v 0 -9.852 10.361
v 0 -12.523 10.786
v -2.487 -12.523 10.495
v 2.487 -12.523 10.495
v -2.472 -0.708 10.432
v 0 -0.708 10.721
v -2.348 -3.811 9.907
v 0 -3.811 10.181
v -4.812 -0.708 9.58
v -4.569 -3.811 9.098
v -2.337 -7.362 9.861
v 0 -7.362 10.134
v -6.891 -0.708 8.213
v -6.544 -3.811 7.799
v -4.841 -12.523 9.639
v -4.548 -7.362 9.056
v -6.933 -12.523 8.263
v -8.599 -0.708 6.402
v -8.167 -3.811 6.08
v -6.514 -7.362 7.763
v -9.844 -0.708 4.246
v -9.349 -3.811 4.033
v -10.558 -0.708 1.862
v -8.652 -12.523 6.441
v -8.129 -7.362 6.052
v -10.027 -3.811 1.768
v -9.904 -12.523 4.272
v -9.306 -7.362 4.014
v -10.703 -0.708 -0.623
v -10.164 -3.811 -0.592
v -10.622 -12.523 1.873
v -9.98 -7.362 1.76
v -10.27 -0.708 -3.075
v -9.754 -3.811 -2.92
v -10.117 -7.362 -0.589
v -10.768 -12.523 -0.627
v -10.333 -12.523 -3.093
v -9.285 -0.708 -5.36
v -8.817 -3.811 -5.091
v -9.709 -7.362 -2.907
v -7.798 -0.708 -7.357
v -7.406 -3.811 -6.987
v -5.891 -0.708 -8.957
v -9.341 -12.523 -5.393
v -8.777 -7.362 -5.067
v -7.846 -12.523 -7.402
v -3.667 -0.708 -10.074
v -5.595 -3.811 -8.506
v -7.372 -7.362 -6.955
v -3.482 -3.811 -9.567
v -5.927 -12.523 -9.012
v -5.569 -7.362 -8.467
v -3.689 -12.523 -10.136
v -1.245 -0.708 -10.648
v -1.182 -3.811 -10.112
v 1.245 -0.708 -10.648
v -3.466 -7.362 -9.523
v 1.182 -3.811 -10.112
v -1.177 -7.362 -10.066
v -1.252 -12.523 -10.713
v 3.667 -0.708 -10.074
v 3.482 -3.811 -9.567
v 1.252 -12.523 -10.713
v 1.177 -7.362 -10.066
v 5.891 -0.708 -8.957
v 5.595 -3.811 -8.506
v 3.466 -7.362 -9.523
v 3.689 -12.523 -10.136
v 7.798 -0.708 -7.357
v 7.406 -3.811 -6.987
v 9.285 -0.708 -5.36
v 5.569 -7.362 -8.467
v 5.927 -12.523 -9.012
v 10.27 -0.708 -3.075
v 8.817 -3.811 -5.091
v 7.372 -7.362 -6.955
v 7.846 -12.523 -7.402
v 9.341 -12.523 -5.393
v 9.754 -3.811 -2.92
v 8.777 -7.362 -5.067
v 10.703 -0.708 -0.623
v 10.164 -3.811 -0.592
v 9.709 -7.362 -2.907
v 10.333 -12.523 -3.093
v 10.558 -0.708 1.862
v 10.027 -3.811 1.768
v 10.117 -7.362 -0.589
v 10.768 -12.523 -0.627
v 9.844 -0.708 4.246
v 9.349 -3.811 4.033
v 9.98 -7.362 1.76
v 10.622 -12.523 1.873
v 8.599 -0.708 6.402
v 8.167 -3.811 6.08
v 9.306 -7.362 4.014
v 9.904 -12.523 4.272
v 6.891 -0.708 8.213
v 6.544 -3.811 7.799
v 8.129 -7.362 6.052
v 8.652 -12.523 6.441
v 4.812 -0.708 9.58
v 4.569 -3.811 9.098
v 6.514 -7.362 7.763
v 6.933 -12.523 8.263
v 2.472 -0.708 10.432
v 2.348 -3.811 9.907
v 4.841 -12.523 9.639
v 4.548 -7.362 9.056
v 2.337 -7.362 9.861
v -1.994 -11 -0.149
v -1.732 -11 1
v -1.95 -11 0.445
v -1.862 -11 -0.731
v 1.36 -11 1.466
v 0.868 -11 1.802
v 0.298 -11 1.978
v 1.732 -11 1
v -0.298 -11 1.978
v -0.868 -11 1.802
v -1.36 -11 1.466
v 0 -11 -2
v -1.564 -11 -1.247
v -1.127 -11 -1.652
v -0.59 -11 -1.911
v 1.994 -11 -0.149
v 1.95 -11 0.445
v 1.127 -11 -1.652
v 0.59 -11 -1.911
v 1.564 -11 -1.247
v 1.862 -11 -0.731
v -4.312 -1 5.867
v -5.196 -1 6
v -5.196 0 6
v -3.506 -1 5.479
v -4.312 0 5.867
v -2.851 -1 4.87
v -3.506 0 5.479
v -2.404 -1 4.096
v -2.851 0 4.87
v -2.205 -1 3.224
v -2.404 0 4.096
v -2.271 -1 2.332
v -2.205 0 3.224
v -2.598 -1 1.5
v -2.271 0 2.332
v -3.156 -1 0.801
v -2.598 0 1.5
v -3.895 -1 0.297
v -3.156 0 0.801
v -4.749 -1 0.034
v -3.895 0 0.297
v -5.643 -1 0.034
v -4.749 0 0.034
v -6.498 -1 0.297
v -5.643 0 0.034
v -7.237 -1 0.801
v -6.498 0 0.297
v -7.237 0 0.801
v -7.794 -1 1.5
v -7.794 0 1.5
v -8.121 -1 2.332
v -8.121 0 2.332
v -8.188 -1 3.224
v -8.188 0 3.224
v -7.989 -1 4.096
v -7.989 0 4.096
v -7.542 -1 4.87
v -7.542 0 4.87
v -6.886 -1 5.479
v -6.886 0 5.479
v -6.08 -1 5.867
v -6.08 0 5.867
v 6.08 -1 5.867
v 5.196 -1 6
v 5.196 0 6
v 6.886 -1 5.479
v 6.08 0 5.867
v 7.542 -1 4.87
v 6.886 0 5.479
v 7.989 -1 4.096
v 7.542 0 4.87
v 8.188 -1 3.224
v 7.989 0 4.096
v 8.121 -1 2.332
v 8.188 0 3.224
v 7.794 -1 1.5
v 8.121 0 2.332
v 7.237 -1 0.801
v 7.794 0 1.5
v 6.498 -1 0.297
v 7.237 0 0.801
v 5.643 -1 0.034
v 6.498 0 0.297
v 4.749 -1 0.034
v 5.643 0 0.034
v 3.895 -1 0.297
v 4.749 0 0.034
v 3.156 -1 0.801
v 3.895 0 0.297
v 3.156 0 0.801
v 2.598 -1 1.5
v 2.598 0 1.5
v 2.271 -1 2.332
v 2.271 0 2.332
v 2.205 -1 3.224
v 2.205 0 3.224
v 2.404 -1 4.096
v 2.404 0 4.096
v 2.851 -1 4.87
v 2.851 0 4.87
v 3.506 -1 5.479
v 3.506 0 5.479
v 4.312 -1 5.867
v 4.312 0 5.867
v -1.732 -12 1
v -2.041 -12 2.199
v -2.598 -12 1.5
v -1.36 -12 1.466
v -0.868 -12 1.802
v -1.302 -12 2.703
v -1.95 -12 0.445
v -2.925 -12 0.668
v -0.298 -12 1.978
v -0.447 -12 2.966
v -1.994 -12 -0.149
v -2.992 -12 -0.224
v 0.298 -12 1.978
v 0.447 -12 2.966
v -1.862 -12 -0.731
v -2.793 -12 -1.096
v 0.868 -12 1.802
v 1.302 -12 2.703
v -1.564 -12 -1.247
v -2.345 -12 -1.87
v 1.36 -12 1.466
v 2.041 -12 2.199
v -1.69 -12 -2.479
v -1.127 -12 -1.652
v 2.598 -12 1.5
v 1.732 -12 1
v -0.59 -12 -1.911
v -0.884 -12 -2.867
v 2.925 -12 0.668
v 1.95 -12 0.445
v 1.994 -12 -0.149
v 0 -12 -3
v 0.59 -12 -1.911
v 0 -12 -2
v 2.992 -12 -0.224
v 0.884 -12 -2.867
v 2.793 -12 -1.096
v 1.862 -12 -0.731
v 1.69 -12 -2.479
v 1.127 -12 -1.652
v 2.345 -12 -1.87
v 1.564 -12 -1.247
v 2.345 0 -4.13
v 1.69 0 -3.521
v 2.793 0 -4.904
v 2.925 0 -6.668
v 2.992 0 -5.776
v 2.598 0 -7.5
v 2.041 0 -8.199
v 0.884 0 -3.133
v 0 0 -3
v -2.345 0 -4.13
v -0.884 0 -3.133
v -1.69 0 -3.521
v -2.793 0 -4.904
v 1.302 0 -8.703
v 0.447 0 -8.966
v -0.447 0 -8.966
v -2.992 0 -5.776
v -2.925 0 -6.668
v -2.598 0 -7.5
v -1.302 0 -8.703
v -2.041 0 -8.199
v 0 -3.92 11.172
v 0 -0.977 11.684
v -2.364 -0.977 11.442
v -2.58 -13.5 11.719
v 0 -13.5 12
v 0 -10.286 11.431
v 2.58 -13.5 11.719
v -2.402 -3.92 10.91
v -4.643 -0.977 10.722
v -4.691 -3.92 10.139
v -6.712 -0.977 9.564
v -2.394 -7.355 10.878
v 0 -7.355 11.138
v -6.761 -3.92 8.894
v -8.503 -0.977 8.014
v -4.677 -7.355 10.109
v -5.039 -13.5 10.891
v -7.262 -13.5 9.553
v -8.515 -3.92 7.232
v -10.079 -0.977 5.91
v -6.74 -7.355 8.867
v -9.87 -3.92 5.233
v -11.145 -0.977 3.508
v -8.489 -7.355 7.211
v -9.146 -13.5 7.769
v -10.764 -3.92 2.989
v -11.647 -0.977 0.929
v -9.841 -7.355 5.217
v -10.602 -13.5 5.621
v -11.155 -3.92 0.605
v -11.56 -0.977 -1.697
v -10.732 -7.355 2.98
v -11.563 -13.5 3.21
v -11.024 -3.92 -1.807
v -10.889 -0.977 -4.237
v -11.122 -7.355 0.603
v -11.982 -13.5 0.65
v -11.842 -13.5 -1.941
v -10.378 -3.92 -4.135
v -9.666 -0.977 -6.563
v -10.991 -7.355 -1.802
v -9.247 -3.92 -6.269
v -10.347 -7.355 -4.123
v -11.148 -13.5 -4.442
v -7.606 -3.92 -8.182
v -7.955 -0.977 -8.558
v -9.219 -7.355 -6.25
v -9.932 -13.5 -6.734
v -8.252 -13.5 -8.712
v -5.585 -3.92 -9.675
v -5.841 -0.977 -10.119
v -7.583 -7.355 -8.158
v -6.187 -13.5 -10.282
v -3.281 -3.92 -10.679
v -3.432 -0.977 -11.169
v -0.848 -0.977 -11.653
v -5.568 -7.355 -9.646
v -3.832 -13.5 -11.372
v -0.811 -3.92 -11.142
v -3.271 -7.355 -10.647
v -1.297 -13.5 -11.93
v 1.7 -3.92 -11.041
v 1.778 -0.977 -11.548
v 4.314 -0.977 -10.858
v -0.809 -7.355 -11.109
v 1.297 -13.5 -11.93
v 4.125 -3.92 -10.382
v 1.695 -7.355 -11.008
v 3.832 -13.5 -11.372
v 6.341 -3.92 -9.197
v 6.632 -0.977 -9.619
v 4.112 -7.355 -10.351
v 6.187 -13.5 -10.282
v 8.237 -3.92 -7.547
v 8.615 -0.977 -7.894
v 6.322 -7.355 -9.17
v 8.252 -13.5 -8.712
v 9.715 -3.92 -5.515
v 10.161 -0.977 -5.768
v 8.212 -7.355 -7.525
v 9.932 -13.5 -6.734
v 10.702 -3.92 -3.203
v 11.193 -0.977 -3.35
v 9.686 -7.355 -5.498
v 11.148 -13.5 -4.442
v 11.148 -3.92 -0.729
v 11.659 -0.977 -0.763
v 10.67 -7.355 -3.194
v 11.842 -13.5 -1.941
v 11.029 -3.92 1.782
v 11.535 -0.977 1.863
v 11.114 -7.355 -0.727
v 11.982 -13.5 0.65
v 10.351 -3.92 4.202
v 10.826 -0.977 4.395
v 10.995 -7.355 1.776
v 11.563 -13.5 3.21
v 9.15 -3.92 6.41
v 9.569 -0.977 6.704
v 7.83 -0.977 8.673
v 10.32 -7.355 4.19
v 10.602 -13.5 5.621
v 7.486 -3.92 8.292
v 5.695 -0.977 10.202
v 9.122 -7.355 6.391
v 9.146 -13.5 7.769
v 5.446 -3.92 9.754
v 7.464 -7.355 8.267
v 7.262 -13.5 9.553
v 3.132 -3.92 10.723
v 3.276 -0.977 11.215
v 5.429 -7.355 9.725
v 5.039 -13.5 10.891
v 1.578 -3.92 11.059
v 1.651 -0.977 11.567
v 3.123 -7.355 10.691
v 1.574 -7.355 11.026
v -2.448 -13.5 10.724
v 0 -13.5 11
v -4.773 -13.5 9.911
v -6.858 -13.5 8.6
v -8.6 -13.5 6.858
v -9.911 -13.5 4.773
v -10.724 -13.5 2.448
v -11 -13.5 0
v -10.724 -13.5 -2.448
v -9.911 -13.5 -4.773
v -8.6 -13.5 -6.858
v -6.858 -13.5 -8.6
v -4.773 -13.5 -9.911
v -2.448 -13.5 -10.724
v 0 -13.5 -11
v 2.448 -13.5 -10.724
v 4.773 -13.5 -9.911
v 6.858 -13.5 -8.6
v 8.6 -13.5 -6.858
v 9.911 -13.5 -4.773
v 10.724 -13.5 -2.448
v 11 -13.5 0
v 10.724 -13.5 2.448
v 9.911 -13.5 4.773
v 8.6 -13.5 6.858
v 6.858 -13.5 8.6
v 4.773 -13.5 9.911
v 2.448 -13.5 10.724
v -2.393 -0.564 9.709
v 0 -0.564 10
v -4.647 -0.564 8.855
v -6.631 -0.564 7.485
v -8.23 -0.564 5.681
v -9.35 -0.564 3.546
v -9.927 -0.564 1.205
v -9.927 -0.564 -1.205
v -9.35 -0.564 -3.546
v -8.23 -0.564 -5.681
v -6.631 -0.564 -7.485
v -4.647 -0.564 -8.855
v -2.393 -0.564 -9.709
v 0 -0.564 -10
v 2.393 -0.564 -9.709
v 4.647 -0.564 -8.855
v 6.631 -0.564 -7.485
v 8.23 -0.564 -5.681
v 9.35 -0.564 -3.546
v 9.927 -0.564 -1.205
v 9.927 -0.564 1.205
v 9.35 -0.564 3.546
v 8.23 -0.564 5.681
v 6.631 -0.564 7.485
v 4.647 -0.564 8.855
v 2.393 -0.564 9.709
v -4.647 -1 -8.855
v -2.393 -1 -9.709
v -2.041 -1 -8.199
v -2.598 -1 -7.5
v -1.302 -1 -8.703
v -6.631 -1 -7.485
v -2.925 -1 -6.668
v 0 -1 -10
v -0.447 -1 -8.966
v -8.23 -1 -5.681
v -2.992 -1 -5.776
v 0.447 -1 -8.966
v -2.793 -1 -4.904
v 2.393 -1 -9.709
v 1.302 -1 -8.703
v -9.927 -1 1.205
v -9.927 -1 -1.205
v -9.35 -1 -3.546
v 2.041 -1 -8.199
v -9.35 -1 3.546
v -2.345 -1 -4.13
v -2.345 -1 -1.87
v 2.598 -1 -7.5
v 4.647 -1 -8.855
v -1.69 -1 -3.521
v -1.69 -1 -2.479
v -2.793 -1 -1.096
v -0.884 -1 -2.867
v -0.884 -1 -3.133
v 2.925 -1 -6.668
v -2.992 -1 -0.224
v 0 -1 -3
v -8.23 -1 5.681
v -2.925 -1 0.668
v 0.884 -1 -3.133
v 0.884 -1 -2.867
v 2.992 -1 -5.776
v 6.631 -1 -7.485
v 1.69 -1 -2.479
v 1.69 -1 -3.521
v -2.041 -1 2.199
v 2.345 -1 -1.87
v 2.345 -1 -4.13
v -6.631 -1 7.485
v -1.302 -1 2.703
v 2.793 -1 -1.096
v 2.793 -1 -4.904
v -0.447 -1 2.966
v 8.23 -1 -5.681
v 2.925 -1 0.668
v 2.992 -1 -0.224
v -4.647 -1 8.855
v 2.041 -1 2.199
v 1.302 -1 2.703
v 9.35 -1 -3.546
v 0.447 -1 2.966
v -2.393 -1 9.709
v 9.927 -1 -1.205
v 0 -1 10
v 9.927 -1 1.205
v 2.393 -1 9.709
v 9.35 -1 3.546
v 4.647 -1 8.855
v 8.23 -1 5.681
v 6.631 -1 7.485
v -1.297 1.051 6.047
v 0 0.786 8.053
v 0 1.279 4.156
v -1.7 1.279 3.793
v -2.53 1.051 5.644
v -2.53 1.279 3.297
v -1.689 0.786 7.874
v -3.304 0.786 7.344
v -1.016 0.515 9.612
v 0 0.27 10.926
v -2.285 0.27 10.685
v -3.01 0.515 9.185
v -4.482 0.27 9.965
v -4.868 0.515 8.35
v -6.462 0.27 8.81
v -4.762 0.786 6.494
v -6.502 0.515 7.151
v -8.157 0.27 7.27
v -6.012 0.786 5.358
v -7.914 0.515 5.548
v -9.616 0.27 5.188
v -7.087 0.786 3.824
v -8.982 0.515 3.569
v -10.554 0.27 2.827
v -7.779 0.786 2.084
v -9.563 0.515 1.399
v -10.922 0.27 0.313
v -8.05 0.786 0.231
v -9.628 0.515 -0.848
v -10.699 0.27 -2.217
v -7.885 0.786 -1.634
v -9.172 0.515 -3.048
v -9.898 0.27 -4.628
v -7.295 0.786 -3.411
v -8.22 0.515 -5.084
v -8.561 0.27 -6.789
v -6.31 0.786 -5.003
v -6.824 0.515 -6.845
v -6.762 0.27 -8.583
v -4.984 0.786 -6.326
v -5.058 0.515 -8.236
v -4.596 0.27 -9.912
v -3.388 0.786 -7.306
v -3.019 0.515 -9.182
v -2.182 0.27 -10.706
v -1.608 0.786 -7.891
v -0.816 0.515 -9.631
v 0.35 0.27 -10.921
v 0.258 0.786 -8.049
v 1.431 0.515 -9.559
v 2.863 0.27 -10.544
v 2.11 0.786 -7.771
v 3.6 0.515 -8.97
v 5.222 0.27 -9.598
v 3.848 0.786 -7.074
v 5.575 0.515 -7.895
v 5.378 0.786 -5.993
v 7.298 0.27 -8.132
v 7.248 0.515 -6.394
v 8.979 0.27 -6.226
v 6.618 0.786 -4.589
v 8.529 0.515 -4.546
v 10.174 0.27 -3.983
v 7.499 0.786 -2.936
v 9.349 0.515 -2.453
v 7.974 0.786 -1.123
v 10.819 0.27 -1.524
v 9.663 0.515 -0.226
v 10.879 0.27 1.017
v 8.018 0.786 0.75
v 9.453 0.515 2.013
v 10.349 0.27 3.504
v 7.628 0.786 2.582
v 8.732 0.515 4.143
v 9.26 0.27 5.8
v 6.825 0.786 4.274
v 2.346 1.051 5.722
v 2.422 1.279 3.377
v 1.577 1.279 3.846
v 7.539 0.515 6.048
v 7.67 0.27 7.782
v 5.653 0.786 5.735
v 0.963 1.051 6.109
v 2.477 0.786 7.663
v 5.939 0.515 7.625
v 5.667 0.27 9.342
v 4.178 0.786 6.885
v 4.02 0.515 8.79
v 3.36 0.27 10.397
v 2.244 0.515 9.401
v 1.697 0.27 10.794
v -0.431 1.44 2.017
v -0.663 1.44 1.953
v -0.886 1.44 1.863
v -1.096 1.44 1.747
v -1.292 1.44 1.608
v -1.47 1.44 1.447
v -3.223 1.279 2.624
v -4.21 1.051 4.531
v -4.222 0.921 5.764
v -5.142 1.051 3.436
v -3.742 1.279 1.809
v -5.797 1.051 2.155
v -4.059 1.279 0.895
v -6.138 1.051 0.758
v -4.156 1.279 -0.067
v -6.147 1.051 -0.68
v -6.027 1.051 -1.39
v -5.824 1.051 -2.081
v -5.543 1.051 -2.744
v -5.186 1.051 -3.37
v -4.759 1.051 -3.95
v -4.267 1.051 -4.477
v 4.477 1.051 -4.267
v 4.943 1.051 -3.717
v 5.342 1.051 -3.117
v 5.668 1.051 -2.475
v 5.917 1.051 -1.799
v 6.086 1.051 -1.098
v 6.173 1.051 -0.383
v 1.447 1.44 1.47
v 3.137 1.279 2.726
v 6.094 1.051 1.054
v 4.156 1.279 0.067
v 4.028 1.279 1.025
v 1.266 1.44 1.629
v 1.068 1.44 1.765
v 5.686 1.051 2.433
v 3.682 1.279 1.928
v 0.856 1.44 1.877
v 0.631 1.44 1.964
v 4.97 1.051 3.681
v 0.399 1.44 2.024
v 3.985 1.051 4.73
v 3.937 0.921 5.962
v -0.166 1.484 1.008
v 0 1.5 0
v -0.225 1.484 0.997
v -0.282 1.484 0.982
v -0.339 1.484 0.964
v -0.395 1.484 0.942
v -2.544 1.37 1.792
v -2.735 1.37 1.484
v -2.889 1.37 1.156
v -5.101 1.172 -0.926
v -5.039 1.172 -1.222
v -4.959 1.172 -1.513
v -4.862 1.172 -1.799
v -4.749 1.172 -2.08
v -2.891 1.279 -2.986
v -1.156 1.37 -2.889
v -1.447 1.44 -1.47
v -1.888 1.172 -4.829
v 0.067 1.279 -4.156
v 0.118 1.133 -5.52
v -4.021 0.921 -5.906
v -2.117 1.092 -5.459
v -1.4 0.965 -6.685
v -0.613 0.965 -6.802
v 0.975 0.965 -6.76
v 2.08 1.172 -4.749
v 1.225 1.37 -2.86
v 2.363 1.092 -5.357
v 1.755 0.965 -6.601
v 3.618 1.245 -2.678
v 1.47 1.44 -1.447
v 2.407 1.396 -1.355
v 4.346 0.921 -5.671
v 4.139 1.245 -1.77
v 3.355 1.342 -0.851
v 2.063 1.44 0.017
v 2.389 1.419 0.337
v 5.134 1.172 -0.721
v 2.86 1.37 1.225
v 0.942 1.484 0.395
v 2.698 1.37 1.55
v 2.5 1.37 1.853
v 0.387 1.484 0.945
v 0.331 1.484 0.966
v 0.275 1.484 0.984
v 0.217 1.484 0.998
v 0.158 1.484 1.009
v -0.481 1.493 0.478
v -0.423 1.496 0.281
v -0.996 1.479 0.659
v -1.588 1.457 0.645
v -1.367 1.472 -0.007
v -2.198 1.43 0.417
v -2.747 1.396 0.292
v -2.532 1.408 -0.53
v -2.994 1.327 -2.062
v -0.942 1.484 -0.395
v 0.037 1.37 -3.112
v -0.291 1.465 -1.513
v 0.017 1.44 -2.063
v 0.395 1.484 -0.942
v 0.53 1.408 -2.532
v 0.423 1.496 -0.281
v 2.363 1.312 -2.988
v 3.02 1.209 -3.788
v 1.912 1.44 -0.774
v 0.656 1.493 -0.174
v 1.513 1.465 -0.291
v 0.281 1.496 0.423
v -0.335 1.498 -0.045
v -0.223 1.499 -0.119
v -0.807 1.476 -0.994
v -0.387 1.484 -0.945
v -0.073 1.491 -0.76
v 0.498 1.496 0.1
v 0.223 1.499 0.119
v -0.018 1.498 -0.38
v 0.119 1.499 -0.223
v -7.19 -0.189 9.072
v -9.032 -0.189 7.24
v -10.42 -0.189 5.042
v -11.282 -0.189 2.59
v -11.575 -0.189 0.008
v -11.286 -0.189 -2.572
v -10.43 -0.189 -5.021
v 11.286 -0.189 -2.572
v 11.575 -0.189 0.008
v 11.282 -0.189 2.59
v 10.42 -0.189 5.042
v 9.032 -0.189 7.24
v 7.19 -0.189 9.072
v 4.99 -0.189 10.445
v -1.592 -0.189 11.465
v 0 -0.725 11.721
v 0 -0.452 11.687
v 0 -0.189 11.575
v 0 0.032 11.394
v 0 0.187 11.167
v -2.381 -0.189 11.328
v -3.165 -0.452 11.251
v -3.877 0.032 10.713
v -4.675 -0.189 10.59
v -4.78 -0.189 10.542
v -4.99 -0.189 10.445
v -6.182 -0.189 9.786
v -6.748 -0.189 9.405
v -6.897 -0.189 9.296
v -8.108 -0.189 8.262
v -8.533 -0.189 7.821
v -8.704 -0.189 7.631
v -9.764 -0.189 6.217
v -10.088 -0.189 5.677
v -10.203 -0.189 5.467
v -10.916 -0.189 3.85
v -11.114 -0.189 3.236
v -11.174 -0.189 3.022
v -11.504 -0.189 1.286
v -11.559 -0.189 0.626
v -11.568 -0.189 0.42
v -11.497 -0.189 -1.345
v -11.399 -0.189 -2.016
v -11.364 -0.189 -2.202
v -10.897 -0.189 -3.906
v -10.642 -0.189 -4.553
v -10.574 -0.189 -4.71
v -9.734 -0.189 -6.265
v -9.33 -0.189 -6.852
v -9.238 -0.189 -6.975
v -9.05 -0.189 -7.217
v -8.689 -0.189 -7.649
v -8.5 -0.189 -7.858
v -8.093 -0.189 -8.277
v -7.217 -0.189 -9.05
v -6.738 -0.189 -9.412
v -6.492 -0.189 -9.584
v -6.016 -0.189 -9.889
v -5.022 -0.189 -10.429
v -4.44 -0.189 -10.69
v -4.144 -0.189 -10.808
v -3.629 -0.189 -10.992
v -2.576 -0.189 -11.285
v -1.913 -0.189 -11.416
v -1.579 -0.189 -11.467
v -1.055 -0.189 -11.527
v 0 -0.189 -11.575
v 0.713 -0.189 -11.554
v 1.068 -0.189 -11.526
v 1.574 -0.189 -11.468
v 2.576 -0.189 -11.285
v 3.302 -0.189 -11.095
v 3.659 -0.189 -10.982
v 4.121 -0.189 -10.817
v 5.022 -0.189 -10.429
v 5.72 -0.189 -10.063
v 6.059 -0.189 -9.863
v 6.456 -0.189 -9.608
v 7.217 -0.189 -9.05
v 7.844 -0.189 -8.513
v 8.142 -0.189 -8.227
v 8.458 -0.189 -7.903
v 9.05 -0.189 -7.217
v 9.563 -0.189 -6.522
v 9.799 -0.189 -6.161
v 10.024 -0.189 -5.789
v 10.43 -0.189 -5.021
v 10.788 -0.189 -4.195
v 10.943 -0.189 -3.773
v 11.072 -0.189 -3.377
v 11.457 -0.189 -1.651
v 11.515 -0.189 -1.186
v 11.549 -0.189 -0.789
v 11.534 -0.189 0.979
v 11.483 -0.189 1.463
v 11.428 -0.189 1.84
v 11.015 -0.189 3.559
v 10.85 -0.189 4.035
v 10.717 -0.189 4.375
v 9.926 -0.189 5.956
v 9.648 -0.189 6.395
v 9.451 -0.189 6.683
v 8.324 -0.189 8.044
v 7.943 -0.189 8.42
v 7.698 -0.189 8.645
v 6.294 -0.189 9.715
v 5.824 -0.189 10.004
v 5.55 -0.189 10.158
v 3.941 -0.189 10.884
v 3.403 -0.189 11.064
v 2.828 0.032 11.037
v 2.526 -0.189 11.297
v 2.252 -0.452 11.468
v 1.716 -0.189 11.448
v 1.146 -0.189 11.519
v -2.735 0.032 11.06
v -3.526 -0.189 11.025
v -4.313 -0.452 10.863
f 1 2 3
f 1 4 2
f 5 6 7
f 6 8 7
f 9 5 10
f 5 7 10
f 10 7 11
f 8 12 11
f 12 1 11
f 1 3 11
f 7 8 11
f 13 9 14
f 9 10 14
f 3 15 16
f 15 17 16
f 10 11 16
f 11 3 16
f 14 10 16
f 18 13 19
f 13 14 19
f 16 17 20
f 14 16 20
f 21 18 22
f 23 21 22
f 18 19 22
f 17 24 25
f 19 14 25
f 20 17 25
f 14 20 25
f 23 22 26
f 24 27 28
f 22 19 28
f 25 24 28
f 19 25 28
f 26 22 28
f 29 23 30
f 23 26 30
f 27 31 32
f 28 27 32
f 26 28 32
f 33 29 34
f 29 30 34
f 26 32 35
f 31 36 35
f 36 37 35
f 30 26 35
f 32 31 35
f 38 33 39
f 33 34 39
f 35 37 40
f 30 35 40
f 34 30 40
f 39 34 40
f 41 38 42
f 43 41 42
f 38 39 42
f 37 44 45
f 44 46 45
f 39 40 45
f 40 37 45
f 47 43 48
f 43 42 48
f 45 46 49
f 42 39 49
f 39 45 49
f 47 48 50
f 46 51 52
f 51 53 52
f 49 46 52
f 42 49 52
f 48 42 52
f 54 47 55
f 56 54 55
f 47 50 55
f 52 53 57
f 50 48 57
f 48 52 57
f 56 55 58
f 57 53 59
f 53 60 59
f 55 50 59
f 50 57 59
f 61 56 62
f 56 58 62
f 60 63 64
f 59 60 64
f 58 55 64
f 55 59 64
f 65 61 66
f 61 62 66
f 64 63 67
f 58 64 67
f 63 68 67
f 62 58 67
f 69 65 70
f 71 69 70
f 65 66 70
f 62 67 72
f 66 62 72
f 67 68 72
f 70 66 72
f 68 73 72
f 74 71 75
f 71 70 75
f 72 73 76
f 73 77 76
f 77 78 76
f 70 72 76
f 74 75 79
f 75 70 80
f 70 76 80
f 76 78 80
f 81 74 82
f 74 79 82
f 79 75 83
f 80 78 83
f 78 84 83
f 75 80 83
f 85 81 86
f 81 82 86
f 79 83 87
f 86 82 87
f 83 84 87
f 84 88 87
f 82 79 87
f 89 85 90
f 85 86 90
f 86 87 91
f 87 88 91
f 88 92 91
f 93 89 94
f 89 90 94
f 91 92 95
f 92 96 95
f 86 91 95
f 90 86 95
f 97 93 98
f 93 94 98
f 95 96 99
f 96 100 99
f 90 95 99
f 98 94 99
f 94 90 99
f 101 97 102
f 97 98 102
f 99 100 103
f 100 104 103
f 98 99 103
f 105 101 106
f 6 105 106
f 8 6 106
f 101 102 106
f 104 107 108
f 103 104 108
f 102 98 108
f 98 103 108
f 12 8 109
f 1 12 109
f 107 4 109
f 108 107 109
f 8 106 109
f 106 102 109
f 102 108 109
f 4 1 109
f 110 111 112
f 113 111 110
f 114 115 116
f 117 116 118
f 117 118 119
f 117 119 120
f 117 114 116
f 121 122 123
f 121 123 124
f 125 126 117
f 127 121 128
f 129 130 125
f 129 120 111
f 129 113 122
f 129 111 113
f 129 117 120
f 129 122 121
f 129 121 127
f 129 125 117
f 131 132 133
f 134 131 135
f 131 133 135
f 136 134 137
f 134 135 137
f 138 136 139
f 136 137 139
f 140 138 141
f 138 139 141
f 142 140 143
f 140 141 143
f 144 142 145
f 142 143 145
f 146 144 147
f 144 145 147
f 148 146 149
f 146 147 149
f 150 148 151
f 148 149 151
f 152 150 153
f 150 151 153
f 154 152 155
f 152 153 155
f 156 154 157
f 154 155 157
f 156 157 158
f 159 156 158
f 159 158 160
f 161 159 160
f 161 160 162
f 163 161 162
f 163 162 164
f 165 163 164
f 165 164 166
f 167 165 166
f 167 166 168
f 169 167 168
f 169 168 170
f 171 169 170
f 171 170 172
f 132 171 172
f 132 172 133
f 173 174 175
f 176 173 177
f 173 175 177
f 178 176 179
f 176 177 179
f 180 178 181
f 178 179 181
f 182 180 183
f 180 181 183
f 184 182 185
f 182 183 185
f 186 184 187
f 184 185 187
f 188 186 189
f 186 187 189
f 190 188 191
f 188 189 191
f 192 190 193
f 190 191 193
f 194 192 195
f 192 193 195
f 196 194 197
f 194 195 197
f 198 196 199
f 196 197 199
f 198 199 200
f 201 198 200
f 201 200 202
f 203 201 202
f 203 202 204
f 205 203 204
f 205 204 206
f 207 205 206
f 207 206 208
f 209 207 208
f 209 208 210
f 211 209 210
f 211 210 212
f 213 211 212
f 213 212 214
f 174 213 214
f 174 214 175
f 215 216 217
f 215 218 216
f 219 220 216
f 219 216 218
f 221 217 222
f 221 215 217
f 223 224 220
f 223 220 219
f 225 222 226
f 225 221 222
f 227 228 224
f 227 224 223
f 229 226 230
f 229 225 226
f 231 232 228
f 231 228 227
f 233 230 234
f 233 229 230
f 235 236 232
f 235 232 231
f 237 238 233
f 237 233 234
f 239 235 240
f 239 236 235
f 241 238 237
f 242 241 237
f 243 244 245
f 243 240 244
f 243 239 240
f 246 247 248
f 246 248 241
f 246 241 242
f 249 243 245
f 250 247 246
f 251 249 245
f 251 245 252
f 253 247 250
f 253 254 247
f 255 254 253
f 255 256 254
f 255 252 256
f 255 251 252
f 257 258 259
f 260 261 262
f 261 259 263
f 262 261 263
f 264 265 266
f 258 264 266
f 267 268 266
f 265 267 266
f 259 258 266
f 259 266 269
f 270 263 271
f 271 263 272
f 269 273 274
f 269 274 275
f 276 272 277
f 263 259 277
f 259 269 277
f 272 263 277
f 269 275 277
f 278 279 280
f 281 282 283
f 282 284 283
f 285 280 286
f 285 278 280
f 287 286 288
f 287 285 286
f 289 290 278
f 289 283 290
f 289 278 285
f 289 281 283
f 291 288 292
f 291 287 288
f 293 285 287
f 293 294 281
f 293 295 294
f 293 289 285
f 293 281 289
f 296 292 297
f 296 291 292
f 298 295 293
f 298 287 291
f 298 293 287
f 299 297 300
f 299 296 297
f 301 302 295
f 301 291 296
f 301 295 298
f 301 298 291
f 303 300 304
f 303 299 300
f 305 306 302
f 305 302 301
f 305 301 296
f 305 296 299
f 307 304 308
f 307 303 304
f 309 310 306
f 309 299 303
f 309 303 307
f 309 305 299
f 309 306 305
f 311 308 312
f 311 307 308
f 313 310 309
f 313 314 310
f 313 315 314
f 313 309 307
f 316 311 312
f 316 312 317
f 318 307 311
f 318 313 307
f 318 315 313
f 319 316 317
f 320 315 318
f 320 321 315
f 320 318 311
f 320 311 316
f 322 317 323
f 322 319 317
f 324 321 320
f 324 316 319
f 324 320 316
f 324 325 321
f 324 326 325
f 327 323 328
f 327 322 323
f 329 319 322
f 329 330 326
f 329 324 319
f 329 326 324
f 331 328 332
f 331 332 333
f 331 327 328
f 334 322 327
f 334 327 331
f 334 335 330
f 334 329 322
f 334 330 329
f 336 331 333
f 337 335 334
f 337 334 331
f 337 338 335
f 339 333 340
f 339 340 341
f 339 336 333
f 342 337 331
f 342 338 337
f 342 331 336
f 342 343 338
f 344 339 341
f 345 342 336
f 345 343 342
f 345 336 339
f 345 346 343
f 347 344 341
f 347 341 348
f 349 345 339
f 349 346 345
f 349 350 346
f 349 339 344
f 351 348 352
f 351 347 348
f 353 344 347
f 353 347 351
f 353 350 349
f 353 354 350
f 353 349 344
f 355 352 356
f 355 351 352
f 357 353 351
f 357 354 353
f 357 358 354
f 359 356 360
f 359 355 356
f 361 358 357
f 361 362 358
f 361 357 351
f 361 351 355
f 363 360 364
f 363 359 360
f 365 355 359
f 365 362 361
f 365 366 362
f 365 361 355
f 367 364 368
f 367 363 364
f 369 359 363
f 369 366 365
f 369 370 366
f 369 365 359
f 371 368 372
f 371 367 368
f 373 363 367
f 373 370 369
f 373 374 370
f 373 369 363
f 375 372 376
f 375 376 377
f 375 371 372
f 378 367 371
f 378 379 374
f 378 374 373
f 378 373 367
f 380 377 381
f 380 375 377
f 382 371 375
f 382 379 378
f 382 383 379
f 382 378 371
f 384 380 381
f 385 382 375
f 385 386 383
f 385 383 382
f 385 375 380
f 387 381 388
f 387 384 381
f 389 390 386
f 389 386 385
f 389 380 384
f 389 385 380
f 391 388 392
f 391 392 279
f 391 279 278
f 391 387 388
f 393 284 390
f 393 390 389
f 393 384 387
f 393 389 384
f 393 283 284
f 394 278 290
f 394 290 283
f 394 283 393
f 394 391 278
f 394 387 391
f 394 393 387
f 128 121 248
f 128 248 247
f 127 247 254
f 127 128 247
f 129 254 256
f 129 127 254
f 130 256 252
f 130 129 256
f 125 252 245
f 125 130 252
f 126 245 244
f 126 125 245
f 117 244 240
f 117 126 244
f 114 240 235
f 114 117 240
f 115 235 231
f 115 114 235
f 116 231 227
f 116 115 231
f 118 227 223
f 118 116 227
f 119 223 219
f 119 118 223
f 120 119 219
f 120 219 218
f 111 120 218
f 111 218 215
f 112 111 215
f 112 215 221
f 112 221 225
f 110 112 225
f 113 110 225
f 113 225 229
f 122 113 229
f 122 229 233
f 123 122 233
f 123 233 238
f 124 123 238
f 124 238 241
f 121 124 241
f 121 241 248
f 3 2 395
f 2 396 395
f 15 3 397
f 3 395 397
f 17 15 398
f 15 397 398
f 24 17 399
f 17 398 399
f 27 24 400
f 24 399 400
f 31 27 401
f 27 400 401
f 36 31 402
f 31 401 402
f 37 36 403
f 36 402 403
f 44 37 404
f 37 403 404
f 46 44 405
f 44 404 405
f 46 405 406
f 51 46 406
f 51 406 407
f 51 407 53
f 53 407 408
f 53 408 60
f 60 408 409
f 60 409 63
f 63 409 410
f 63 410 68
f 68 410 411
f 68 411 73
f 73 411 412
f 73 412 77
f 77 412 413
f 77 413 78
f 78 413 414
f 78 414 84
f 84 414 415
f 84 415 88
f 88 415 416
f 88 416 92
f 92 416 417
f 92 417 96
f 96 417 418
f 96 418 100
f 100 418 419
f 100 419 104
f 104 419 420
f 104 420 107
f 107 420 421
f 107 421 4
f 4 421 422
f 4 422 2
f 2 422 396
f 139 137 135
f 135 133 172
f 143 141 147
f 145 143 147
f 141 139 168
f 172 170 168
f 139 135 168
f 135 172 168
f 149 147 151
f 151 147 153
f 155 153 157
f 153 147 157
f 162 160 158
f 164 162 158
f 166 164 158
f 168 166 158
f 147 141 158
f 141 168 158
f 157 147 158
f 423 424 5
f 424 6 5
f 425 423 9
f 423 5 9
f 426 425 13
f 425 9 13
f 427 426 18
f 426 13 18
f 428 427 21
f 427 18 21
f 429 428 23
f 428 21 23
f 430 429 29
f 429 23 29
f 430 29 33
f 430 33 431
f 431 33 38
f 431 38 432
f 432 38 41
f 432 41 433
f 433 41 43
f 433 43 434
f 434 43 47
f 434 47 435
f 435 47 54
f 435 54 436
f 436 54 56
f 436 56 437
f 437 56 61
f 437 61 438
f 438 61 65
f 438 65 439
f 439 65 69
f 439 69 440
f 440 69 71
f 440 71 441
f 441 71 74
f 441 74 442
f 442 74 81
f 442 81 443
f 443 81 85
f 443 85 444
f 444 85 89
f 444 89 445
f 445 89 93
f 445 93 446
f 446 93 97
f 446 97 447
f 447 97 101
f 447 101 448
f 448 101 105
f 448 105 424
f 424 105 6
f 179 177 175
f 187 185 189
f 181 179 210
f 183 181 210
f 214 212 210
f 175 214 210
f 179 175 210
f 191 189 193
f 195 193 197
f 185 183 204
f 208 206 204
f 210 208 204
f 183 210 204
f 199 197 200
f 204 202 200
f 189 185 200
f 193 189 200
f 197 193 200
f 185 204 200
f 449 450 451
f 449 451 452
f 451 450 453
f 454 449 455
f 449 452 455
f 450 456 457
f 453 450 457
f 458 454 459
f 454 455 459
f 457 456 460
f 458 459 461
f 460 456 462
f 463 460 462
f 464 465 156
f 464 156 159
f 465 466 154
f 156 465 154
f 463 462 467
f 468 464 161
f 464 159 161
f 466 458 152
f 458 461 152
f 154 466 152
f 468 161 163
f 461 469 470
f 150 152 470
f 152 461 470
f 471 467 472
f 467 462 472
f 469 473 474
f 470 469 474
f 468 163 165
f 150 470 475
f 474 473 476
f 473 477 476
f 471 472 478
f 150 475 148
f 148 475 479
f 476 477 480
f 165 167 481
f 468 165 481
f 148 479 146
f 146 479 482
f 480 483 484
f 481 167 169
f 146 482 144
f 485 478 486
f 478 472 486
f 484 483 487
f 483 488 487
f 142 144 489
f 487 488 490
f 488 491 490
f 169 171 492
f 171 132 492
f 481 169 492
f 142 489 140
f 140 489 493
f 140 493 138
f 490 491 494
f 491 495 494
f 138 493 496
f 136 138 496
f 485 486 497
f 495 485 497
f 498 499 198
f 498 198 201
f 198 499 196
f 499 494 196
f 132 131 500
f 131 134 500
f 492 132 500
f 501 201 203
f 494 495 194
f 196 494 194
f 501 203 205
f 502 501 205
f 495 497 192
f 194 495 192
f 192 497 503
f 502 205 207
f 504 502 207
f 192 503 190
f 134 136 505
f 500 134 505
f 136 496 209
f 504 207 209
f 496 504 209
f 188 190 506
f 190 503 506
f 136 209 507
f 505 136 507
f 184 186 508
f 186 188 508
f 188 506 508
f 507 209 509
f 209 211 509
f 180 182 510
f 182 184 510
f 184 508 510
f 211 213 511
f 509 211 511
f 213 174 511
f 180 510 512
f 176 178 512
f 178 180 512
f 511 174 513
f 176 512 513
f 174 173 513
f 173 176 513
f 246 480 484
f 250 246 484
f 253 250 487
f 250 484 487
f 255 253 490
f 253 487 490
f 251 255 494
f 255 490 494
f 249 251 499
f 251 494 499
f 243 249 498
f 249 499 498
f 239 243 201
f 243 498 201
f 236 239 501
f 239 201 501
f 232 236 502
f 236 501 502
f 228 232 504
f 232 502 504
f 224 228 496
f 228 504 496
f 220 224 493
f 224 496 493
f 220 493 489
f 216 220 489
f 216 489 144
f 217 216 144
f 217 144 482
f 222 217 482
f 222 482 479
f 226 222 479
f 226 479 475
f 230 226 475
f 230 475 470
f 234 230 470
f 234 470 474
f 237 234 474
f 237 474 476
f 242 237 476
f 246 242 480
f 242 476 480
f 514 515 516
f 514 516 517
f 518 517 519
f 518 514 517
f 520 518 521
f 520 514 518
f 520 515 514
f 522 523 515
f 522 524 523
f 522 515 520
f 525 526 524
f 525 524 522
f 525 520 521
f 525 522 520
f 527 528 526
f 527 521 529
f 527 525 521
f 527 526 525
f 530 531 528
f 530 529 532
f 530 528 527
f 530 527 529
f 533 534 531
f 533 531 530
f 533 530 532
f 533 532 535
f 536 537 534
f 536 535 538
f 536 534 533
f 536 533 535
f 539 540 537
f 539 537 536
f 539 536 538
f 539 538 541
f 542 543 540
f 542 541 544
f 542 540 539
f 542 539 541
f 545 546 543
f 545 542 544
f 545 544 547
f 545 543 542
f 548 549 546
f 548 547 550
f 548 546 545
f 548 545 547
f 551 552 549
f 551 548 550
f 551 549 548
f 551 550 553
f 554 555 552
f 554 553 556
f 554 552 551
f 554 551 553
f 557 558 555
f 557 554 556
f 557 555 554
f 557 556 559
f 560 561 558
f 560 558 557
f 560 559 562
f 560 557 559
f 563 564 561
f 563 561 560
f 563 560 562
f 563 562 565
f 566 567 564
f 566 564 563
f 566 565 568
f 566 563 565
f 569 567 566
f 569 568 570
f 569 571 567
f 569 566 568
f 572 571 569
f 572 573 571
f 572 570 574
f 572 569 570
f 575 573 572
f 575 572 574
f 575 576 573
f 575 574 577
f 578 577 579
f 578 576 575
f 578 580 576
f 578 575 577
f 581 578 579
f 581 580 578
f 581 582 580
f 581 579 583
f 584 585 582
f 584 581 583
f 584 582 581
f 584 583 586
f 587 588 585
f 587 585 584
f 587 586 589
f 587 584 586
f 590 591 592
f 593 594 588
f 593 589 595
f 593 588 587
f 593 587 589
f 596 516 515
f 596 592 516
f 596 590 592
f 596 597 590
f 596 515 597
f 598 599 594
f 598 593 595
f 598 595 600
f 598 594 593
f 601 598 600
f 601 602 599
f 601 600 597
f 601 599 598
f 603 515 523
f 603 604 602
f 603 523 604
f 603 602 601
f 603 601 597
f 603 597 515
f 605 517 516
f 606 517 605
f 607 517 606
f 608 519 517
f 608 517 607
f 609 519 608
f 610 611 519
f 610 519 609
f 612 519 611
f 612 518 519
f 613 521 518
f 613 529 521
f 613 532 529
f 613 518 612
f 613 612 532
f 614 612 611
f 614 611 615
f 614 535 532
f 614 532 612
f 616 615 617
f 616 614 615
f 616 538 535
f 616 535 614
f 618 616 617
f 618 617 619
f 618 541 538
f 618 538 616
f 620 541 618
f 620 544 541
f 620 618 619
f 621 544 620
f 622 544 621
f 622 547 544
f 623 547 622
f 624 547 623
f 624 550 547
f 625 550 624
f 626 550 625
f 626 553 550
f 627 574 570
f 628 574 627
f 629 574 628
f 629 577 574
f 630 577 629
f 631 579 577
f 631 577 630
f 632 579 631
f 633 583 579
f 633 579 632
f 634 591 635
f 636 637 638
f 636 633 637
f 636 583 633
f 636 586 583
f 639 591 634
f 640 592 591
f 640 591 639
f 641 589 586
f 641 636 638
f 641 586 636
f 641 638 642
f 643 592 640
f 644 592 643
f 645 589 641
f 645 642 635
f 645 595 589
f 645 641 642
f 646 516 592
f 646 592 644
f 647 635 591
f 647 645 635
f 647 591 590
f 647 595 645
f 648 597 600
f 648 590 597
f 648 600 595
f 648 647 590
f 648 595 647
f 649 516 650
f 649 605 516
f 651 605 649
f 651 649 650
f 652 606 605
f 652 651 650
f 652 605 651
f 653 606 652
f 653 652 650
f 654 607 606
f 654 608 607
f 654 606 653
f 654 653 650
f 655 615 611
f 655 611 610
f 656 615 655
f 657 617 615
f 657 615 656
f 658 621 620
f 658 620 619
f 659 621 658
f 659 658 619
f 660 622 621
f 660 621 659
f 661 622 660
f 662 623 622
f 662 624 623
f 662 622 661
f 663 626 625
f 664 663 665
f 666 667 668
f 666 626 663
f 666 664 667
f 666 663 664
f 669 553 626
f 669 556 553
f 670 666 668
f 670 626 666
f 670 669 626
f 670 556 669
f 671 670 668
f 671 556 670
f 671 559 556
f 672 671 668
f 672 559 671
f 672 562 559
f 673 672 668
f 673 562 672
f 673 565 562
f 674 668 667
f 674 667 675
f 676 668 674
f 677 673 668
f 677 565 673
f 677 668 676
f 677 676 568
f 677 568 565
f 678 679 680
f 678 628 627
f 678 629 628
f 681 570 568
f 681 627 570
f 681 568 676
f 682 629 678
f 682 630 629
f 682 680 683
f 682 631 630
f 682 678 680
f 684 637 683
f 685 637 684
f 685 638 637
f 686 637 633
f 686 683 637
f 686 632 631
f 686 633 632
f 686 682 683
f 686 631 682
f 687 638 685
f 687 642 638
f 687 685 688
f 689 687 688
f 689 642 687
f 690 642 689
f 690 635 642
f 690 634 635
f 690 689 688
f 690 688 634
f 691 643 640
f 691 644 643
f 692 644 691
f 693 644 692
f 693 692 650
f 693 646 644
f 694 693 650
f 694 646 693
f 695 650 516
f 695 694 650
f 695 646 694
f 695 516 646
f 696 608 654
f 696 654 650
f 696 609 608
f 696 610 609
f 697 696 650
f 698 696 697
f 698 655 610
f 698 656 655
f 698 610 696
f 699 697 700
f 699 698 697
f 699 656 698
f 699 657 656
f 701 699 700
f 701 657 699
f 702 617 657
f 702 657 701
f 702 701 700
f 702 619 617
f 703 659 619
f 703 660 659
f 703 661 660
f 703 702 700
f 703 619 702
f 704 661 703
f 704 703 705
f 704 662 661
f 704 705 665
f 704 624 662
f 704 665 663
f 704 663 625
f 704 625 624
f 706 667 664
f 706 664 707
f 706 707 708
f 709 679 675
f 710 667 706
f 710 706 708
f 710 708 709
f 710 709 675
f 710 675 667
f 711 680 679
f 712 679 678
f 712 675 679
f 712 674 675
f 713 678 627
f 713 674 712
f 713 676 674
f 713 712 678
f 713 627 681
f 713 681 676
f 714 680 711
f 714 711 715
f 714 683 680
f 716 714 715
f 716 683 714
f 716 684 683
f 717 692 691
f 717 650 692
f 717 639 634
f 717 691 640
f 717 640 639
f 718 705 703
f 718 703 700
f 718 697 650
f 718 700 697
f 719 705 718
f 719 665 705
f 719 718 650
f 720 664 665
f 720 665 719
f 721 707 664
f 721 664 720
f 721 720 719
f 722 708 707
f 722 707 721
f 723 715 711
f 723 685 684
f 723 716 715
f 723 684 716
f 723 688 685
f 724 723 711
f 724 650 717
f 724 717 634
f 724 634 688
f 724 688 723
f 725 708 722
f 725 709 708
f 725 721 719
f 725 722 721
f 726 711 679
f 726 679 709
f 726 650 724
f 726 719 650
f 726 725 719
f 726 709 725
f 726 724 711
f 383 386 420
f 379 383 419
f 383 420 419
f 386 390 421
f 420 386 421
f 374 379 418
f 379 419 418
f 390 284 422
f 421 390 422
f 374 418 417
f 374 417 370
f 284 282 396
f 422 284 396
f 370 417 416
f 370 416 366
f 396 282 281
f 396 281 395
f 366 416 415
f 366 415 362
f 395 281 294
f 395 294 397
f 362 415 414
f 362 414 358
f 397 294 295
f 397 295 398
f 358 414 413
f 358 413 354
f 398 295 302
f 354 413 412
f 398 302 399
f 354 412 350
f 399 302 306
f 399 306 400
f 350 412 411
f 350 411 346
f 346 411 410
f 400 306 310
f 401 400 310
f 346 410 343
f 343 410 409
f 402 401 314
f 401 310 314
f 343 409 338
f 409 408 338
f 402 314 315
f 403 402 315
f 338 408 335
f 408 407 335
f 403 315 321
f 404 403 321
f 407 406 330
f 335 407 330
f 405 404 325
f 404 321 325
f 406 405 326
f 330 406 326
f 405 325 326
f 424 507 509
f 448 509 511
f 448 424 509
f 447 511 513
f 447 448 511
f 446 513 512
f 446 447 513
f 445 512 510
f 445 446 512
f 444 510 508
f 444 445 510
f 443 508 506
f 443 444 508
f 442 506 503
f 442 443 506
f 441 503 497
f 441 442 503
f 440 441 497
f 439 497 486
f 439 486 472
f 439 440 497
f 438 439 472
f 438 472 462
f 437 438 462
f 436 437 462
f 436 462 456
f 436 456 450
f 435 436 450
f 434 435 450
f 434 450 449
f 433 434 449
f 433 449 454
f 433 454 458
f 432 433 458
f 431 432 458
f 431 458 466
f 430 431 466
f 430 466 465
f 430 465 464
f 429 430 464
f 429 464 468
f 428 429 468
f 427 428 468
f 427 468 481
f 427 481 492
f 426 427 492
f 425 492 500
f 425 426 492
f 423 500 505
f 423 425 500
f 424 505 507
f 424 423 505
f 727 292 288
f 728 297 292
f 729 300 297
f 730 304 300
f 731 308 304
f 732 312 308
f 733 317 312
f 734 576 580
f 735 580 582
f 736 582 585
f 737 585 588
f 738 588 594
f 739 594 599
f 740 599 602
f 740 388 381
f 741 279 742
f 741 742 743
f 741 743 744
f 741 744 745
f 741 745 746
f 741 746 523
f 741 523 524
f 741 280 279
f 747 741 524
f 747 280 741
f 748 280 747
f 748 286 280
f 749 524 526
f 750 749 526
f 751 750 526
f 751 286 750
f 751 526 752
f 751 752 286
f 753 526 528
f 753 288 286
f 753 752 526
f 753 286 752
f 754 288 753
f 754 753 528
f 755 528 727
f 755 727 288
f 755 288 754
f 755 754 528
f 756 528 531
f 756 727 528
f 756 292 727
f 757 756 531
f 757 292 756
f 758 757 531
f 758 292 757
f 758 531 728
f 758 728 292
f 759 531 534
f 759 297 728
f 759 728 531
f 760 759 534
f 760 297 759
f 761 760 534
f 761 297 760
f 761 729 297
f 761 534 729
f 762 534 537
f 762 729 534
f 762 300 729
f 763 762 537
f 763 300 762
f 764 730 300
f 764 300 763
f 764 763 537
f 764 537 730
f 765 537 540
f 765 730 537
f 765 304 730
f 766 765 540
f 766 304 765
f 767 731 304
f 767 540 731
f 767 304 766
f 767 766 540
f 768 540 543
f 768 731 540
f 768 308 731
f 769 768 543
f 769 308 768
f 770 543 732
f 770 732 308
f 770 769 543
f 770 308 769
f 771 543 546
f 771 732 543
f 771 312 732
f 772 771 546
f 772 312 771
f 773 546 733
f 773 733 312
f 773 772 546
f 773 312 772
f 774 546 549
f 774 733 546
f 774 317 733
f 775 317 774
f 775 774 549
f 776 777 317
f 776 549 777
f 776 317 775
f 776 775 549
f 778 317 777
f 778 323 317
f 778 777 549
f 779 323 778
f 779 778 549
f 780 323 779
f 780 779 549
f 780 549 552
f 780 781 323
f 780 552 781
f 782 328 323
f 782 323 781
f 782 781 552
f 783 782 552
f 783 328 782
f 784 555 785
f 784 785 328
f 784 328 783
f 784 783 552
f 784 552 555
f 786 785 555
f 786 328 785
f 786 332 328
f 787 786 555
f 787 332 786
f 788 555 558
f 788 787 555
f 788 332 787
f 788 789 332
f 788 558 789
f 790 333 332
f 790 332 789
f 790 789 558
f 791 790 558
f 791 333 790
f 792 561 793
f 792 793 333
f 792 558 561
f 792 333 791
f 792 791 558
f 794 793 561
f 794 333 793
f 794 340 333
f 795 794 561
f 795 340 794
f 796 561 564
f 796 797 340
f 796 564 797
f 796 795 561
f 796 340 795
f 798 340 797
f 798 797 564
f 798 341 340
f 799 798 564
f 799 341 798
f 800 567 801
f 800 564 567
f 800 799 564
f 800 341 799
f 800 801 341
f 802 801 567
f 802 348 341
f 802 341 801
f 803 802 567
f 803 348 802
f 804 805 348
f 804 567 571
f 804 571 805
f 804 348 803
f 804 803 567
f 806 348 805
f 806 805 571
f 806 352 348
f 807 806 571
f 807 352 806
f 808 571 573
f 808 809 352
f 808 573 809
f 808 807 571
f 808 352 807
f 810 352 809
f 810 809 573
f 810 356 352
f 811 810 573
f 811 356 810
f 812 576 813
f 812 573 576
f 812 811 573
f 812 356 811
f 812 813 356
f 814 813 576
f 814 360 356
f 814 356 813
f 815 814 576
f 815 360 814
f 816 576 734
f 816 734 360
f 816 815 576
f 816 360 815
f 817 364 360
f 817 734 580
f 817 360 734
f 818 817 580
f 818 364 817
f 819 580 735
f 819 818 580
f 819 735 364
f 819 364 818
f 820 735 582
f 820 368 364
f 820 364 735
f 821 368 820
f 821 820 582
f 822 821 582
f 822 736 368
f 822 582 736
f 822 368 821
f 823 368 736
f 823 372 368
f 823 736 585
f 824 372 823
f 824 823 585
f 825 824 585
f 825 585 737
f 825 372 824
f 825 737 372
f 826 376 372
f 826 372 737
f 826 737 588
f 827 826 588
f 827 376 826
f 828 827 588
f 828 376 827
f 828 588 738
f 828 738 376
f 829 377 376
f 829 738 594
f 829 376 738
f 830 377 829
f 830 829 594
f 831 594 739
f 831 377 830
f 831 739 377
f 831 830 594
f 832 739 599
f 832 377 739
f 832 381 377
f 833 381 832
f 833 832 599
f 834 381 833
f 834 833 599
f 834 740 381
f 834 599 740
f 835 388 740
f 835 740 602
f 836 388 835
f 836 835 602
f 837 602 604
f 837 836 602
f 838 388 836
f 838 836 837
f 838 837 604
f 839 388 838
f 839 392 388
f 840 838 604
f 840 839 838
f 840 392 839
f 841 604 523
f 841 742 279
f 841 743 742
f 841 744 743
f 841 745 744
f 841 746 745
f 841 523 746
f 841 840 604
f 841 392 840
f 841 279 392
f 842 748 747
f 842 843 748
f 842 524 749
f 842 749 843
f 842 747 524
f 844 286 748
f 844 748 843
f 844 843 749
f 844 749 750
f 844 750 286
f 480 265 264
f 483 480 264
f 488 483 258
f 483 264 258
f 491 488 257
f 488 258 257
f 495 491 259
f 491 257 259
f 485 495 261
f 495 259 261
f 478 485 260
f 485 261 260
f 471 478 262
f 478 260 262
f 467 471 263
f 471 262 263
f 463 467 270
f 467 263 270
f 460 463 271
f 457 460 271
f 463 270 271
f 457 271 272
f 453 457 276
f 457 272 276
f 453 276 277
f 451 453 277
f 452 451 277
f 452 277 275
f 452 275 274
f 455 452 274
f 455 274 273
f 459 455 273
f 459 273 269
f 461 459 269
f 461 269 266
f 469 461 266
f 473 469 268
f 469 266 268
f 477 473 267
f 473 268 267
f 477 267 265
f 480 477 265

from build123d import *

# Parameters (mm, degrees)
SKETCH1_R           = 10
SKETCH1_R_2         = 3
BOSS_EXTRUDE1_DEPTH = 1
FILLET1_R           = 1
SKETCH4_R           = 3
SKETCH4_R_2         = 2
BOSS_EXTRUDE2_DEPTH = 11
SKETCH4_3_R         = 2
BOSS_EXTRUDE3_DEPTH = 10


with BuildPart() as part:
    # Sketch1 → Boss-Extrude1 (new body)
    with BuildSketch(Plane(origin=(0, 0, 0), x_dir=(1, 0, 0), z_dir=(0, 1, 0))):
        with Locations(Location((0, 0, 0), (0, 0, 270))):
            Circle(SKETCH1_R)
        with Locations(Location((-5.196152423, -3, 0), (0, 0, 270))):
            Circle(SKETCH1_R_2, mode=Mode.SUBTRACT)
        with Locations(Location((0, 6, 0), (0, 0, 270))):
            Circle(SKETCH1_R_2, mode=Mode.SUBTRACT)
        with Locations(Location((5.196152423, -3, 0), (0, 0, 270))):
            Circle(SKETCH1_R_2, mode=Mode.SUBTRACT)
    extrude(amount=-BOSS_EXTRUDE1_DEPTH)

    # Sketch3 → Revolve1 (revolve)
    with BuildSketch(Plane(origin=(0, 0, 0), x_dir=(0, 0, -1), z_dir=(1, 0, 0)), mode=Mode.PRIVATE) as revolve1_sk:
        with BuildLine():
            add(Edge.make_bspline(
                [(9.999996275, -0.564424697), (10.107211142, -0.584912977), (10.365055698, -0.635077572), (10.582841287, -0.679412651), (10.72084613, -0.70837418)],
                knots=[0.694252252, 0.694252252, 0.694252252, 0.694252252, 0.72632335, 0.774744907, 0.774744907, 0.774744907, 0.774744907], degree=3))
            add(Edge.make_bspline(
                [(10.72084613, -0.70837418), (9.43537713, -5.414836401), (10.786099486, -12.52314455)],
                knots=[0.096446407, 0.096446407, 0.096446407, 0.931611687, 0.931611687, 0.931611687], degree=2))
            Line((10.786099486, -12.52314455), (11, -13.5))
            Line((11, -13.5), (12, -13.5))
            add(Edge.make_bspline(
                [(12, 0), (10.187367032, -4.885390543), (12, -13.5)],
                knots=[0, 0, 0, 1, 1, 1], degree=2))
            add(Edge.make_bspline(
                [(0, 1.5), (5.203758478, 1.5), (11.666860381, 0.188025837), (12, 0)],
                knots=[0, 0, 0, 0, 1, 1, 1, 1], degree=3))
            Line((0, 1.5), (0, 0))
            Line((0, 0), (10, 0))
            Line((10, 0), (9.999996275, -0.564424697))
        make_face()
    revolve(revolve1_sk.sketch.rotate(Axis((0, 0, 0), (0, -1, 0)), 180), axis=Axis((0, 0, 0), (0, -1, 0)))

    # Fillet1
    fillet1_edges = [part.edges().sort_by_distance(p)[0] for p in [
        (0, 0, -12),
    ]]
    fillet(fillet1_edges, radius=FILLET1_R)

    # Sketch4 → Boss-Extrude2 (add)
    with BuildSketch(Plane.XZ.offset(1)):
        with Locations(Location((0, 0, 0), (0, 0, 270))):
            Circle(SKETCH4_R)
        with Locations(Location((0, 0, 0), (0, 0, 270))):
            Circle(SKETCH4_R_2, mode=Mode.SUBTRACT)
    extrude(amount=BOSS_EXTRUDE2_DEPTH)

    # Sketch4<3> → Boss-Extrude3 (add)
    with BuildSketch(Plane.XZ.offset(1)):
        with Locations(Location((0, 0, 0), (0, 0, 270))):
            Circle(SKETCH4_3_R)
    extrude(amount=BOSS_EXTRUDE3_DEPTH)


solid = part.part
